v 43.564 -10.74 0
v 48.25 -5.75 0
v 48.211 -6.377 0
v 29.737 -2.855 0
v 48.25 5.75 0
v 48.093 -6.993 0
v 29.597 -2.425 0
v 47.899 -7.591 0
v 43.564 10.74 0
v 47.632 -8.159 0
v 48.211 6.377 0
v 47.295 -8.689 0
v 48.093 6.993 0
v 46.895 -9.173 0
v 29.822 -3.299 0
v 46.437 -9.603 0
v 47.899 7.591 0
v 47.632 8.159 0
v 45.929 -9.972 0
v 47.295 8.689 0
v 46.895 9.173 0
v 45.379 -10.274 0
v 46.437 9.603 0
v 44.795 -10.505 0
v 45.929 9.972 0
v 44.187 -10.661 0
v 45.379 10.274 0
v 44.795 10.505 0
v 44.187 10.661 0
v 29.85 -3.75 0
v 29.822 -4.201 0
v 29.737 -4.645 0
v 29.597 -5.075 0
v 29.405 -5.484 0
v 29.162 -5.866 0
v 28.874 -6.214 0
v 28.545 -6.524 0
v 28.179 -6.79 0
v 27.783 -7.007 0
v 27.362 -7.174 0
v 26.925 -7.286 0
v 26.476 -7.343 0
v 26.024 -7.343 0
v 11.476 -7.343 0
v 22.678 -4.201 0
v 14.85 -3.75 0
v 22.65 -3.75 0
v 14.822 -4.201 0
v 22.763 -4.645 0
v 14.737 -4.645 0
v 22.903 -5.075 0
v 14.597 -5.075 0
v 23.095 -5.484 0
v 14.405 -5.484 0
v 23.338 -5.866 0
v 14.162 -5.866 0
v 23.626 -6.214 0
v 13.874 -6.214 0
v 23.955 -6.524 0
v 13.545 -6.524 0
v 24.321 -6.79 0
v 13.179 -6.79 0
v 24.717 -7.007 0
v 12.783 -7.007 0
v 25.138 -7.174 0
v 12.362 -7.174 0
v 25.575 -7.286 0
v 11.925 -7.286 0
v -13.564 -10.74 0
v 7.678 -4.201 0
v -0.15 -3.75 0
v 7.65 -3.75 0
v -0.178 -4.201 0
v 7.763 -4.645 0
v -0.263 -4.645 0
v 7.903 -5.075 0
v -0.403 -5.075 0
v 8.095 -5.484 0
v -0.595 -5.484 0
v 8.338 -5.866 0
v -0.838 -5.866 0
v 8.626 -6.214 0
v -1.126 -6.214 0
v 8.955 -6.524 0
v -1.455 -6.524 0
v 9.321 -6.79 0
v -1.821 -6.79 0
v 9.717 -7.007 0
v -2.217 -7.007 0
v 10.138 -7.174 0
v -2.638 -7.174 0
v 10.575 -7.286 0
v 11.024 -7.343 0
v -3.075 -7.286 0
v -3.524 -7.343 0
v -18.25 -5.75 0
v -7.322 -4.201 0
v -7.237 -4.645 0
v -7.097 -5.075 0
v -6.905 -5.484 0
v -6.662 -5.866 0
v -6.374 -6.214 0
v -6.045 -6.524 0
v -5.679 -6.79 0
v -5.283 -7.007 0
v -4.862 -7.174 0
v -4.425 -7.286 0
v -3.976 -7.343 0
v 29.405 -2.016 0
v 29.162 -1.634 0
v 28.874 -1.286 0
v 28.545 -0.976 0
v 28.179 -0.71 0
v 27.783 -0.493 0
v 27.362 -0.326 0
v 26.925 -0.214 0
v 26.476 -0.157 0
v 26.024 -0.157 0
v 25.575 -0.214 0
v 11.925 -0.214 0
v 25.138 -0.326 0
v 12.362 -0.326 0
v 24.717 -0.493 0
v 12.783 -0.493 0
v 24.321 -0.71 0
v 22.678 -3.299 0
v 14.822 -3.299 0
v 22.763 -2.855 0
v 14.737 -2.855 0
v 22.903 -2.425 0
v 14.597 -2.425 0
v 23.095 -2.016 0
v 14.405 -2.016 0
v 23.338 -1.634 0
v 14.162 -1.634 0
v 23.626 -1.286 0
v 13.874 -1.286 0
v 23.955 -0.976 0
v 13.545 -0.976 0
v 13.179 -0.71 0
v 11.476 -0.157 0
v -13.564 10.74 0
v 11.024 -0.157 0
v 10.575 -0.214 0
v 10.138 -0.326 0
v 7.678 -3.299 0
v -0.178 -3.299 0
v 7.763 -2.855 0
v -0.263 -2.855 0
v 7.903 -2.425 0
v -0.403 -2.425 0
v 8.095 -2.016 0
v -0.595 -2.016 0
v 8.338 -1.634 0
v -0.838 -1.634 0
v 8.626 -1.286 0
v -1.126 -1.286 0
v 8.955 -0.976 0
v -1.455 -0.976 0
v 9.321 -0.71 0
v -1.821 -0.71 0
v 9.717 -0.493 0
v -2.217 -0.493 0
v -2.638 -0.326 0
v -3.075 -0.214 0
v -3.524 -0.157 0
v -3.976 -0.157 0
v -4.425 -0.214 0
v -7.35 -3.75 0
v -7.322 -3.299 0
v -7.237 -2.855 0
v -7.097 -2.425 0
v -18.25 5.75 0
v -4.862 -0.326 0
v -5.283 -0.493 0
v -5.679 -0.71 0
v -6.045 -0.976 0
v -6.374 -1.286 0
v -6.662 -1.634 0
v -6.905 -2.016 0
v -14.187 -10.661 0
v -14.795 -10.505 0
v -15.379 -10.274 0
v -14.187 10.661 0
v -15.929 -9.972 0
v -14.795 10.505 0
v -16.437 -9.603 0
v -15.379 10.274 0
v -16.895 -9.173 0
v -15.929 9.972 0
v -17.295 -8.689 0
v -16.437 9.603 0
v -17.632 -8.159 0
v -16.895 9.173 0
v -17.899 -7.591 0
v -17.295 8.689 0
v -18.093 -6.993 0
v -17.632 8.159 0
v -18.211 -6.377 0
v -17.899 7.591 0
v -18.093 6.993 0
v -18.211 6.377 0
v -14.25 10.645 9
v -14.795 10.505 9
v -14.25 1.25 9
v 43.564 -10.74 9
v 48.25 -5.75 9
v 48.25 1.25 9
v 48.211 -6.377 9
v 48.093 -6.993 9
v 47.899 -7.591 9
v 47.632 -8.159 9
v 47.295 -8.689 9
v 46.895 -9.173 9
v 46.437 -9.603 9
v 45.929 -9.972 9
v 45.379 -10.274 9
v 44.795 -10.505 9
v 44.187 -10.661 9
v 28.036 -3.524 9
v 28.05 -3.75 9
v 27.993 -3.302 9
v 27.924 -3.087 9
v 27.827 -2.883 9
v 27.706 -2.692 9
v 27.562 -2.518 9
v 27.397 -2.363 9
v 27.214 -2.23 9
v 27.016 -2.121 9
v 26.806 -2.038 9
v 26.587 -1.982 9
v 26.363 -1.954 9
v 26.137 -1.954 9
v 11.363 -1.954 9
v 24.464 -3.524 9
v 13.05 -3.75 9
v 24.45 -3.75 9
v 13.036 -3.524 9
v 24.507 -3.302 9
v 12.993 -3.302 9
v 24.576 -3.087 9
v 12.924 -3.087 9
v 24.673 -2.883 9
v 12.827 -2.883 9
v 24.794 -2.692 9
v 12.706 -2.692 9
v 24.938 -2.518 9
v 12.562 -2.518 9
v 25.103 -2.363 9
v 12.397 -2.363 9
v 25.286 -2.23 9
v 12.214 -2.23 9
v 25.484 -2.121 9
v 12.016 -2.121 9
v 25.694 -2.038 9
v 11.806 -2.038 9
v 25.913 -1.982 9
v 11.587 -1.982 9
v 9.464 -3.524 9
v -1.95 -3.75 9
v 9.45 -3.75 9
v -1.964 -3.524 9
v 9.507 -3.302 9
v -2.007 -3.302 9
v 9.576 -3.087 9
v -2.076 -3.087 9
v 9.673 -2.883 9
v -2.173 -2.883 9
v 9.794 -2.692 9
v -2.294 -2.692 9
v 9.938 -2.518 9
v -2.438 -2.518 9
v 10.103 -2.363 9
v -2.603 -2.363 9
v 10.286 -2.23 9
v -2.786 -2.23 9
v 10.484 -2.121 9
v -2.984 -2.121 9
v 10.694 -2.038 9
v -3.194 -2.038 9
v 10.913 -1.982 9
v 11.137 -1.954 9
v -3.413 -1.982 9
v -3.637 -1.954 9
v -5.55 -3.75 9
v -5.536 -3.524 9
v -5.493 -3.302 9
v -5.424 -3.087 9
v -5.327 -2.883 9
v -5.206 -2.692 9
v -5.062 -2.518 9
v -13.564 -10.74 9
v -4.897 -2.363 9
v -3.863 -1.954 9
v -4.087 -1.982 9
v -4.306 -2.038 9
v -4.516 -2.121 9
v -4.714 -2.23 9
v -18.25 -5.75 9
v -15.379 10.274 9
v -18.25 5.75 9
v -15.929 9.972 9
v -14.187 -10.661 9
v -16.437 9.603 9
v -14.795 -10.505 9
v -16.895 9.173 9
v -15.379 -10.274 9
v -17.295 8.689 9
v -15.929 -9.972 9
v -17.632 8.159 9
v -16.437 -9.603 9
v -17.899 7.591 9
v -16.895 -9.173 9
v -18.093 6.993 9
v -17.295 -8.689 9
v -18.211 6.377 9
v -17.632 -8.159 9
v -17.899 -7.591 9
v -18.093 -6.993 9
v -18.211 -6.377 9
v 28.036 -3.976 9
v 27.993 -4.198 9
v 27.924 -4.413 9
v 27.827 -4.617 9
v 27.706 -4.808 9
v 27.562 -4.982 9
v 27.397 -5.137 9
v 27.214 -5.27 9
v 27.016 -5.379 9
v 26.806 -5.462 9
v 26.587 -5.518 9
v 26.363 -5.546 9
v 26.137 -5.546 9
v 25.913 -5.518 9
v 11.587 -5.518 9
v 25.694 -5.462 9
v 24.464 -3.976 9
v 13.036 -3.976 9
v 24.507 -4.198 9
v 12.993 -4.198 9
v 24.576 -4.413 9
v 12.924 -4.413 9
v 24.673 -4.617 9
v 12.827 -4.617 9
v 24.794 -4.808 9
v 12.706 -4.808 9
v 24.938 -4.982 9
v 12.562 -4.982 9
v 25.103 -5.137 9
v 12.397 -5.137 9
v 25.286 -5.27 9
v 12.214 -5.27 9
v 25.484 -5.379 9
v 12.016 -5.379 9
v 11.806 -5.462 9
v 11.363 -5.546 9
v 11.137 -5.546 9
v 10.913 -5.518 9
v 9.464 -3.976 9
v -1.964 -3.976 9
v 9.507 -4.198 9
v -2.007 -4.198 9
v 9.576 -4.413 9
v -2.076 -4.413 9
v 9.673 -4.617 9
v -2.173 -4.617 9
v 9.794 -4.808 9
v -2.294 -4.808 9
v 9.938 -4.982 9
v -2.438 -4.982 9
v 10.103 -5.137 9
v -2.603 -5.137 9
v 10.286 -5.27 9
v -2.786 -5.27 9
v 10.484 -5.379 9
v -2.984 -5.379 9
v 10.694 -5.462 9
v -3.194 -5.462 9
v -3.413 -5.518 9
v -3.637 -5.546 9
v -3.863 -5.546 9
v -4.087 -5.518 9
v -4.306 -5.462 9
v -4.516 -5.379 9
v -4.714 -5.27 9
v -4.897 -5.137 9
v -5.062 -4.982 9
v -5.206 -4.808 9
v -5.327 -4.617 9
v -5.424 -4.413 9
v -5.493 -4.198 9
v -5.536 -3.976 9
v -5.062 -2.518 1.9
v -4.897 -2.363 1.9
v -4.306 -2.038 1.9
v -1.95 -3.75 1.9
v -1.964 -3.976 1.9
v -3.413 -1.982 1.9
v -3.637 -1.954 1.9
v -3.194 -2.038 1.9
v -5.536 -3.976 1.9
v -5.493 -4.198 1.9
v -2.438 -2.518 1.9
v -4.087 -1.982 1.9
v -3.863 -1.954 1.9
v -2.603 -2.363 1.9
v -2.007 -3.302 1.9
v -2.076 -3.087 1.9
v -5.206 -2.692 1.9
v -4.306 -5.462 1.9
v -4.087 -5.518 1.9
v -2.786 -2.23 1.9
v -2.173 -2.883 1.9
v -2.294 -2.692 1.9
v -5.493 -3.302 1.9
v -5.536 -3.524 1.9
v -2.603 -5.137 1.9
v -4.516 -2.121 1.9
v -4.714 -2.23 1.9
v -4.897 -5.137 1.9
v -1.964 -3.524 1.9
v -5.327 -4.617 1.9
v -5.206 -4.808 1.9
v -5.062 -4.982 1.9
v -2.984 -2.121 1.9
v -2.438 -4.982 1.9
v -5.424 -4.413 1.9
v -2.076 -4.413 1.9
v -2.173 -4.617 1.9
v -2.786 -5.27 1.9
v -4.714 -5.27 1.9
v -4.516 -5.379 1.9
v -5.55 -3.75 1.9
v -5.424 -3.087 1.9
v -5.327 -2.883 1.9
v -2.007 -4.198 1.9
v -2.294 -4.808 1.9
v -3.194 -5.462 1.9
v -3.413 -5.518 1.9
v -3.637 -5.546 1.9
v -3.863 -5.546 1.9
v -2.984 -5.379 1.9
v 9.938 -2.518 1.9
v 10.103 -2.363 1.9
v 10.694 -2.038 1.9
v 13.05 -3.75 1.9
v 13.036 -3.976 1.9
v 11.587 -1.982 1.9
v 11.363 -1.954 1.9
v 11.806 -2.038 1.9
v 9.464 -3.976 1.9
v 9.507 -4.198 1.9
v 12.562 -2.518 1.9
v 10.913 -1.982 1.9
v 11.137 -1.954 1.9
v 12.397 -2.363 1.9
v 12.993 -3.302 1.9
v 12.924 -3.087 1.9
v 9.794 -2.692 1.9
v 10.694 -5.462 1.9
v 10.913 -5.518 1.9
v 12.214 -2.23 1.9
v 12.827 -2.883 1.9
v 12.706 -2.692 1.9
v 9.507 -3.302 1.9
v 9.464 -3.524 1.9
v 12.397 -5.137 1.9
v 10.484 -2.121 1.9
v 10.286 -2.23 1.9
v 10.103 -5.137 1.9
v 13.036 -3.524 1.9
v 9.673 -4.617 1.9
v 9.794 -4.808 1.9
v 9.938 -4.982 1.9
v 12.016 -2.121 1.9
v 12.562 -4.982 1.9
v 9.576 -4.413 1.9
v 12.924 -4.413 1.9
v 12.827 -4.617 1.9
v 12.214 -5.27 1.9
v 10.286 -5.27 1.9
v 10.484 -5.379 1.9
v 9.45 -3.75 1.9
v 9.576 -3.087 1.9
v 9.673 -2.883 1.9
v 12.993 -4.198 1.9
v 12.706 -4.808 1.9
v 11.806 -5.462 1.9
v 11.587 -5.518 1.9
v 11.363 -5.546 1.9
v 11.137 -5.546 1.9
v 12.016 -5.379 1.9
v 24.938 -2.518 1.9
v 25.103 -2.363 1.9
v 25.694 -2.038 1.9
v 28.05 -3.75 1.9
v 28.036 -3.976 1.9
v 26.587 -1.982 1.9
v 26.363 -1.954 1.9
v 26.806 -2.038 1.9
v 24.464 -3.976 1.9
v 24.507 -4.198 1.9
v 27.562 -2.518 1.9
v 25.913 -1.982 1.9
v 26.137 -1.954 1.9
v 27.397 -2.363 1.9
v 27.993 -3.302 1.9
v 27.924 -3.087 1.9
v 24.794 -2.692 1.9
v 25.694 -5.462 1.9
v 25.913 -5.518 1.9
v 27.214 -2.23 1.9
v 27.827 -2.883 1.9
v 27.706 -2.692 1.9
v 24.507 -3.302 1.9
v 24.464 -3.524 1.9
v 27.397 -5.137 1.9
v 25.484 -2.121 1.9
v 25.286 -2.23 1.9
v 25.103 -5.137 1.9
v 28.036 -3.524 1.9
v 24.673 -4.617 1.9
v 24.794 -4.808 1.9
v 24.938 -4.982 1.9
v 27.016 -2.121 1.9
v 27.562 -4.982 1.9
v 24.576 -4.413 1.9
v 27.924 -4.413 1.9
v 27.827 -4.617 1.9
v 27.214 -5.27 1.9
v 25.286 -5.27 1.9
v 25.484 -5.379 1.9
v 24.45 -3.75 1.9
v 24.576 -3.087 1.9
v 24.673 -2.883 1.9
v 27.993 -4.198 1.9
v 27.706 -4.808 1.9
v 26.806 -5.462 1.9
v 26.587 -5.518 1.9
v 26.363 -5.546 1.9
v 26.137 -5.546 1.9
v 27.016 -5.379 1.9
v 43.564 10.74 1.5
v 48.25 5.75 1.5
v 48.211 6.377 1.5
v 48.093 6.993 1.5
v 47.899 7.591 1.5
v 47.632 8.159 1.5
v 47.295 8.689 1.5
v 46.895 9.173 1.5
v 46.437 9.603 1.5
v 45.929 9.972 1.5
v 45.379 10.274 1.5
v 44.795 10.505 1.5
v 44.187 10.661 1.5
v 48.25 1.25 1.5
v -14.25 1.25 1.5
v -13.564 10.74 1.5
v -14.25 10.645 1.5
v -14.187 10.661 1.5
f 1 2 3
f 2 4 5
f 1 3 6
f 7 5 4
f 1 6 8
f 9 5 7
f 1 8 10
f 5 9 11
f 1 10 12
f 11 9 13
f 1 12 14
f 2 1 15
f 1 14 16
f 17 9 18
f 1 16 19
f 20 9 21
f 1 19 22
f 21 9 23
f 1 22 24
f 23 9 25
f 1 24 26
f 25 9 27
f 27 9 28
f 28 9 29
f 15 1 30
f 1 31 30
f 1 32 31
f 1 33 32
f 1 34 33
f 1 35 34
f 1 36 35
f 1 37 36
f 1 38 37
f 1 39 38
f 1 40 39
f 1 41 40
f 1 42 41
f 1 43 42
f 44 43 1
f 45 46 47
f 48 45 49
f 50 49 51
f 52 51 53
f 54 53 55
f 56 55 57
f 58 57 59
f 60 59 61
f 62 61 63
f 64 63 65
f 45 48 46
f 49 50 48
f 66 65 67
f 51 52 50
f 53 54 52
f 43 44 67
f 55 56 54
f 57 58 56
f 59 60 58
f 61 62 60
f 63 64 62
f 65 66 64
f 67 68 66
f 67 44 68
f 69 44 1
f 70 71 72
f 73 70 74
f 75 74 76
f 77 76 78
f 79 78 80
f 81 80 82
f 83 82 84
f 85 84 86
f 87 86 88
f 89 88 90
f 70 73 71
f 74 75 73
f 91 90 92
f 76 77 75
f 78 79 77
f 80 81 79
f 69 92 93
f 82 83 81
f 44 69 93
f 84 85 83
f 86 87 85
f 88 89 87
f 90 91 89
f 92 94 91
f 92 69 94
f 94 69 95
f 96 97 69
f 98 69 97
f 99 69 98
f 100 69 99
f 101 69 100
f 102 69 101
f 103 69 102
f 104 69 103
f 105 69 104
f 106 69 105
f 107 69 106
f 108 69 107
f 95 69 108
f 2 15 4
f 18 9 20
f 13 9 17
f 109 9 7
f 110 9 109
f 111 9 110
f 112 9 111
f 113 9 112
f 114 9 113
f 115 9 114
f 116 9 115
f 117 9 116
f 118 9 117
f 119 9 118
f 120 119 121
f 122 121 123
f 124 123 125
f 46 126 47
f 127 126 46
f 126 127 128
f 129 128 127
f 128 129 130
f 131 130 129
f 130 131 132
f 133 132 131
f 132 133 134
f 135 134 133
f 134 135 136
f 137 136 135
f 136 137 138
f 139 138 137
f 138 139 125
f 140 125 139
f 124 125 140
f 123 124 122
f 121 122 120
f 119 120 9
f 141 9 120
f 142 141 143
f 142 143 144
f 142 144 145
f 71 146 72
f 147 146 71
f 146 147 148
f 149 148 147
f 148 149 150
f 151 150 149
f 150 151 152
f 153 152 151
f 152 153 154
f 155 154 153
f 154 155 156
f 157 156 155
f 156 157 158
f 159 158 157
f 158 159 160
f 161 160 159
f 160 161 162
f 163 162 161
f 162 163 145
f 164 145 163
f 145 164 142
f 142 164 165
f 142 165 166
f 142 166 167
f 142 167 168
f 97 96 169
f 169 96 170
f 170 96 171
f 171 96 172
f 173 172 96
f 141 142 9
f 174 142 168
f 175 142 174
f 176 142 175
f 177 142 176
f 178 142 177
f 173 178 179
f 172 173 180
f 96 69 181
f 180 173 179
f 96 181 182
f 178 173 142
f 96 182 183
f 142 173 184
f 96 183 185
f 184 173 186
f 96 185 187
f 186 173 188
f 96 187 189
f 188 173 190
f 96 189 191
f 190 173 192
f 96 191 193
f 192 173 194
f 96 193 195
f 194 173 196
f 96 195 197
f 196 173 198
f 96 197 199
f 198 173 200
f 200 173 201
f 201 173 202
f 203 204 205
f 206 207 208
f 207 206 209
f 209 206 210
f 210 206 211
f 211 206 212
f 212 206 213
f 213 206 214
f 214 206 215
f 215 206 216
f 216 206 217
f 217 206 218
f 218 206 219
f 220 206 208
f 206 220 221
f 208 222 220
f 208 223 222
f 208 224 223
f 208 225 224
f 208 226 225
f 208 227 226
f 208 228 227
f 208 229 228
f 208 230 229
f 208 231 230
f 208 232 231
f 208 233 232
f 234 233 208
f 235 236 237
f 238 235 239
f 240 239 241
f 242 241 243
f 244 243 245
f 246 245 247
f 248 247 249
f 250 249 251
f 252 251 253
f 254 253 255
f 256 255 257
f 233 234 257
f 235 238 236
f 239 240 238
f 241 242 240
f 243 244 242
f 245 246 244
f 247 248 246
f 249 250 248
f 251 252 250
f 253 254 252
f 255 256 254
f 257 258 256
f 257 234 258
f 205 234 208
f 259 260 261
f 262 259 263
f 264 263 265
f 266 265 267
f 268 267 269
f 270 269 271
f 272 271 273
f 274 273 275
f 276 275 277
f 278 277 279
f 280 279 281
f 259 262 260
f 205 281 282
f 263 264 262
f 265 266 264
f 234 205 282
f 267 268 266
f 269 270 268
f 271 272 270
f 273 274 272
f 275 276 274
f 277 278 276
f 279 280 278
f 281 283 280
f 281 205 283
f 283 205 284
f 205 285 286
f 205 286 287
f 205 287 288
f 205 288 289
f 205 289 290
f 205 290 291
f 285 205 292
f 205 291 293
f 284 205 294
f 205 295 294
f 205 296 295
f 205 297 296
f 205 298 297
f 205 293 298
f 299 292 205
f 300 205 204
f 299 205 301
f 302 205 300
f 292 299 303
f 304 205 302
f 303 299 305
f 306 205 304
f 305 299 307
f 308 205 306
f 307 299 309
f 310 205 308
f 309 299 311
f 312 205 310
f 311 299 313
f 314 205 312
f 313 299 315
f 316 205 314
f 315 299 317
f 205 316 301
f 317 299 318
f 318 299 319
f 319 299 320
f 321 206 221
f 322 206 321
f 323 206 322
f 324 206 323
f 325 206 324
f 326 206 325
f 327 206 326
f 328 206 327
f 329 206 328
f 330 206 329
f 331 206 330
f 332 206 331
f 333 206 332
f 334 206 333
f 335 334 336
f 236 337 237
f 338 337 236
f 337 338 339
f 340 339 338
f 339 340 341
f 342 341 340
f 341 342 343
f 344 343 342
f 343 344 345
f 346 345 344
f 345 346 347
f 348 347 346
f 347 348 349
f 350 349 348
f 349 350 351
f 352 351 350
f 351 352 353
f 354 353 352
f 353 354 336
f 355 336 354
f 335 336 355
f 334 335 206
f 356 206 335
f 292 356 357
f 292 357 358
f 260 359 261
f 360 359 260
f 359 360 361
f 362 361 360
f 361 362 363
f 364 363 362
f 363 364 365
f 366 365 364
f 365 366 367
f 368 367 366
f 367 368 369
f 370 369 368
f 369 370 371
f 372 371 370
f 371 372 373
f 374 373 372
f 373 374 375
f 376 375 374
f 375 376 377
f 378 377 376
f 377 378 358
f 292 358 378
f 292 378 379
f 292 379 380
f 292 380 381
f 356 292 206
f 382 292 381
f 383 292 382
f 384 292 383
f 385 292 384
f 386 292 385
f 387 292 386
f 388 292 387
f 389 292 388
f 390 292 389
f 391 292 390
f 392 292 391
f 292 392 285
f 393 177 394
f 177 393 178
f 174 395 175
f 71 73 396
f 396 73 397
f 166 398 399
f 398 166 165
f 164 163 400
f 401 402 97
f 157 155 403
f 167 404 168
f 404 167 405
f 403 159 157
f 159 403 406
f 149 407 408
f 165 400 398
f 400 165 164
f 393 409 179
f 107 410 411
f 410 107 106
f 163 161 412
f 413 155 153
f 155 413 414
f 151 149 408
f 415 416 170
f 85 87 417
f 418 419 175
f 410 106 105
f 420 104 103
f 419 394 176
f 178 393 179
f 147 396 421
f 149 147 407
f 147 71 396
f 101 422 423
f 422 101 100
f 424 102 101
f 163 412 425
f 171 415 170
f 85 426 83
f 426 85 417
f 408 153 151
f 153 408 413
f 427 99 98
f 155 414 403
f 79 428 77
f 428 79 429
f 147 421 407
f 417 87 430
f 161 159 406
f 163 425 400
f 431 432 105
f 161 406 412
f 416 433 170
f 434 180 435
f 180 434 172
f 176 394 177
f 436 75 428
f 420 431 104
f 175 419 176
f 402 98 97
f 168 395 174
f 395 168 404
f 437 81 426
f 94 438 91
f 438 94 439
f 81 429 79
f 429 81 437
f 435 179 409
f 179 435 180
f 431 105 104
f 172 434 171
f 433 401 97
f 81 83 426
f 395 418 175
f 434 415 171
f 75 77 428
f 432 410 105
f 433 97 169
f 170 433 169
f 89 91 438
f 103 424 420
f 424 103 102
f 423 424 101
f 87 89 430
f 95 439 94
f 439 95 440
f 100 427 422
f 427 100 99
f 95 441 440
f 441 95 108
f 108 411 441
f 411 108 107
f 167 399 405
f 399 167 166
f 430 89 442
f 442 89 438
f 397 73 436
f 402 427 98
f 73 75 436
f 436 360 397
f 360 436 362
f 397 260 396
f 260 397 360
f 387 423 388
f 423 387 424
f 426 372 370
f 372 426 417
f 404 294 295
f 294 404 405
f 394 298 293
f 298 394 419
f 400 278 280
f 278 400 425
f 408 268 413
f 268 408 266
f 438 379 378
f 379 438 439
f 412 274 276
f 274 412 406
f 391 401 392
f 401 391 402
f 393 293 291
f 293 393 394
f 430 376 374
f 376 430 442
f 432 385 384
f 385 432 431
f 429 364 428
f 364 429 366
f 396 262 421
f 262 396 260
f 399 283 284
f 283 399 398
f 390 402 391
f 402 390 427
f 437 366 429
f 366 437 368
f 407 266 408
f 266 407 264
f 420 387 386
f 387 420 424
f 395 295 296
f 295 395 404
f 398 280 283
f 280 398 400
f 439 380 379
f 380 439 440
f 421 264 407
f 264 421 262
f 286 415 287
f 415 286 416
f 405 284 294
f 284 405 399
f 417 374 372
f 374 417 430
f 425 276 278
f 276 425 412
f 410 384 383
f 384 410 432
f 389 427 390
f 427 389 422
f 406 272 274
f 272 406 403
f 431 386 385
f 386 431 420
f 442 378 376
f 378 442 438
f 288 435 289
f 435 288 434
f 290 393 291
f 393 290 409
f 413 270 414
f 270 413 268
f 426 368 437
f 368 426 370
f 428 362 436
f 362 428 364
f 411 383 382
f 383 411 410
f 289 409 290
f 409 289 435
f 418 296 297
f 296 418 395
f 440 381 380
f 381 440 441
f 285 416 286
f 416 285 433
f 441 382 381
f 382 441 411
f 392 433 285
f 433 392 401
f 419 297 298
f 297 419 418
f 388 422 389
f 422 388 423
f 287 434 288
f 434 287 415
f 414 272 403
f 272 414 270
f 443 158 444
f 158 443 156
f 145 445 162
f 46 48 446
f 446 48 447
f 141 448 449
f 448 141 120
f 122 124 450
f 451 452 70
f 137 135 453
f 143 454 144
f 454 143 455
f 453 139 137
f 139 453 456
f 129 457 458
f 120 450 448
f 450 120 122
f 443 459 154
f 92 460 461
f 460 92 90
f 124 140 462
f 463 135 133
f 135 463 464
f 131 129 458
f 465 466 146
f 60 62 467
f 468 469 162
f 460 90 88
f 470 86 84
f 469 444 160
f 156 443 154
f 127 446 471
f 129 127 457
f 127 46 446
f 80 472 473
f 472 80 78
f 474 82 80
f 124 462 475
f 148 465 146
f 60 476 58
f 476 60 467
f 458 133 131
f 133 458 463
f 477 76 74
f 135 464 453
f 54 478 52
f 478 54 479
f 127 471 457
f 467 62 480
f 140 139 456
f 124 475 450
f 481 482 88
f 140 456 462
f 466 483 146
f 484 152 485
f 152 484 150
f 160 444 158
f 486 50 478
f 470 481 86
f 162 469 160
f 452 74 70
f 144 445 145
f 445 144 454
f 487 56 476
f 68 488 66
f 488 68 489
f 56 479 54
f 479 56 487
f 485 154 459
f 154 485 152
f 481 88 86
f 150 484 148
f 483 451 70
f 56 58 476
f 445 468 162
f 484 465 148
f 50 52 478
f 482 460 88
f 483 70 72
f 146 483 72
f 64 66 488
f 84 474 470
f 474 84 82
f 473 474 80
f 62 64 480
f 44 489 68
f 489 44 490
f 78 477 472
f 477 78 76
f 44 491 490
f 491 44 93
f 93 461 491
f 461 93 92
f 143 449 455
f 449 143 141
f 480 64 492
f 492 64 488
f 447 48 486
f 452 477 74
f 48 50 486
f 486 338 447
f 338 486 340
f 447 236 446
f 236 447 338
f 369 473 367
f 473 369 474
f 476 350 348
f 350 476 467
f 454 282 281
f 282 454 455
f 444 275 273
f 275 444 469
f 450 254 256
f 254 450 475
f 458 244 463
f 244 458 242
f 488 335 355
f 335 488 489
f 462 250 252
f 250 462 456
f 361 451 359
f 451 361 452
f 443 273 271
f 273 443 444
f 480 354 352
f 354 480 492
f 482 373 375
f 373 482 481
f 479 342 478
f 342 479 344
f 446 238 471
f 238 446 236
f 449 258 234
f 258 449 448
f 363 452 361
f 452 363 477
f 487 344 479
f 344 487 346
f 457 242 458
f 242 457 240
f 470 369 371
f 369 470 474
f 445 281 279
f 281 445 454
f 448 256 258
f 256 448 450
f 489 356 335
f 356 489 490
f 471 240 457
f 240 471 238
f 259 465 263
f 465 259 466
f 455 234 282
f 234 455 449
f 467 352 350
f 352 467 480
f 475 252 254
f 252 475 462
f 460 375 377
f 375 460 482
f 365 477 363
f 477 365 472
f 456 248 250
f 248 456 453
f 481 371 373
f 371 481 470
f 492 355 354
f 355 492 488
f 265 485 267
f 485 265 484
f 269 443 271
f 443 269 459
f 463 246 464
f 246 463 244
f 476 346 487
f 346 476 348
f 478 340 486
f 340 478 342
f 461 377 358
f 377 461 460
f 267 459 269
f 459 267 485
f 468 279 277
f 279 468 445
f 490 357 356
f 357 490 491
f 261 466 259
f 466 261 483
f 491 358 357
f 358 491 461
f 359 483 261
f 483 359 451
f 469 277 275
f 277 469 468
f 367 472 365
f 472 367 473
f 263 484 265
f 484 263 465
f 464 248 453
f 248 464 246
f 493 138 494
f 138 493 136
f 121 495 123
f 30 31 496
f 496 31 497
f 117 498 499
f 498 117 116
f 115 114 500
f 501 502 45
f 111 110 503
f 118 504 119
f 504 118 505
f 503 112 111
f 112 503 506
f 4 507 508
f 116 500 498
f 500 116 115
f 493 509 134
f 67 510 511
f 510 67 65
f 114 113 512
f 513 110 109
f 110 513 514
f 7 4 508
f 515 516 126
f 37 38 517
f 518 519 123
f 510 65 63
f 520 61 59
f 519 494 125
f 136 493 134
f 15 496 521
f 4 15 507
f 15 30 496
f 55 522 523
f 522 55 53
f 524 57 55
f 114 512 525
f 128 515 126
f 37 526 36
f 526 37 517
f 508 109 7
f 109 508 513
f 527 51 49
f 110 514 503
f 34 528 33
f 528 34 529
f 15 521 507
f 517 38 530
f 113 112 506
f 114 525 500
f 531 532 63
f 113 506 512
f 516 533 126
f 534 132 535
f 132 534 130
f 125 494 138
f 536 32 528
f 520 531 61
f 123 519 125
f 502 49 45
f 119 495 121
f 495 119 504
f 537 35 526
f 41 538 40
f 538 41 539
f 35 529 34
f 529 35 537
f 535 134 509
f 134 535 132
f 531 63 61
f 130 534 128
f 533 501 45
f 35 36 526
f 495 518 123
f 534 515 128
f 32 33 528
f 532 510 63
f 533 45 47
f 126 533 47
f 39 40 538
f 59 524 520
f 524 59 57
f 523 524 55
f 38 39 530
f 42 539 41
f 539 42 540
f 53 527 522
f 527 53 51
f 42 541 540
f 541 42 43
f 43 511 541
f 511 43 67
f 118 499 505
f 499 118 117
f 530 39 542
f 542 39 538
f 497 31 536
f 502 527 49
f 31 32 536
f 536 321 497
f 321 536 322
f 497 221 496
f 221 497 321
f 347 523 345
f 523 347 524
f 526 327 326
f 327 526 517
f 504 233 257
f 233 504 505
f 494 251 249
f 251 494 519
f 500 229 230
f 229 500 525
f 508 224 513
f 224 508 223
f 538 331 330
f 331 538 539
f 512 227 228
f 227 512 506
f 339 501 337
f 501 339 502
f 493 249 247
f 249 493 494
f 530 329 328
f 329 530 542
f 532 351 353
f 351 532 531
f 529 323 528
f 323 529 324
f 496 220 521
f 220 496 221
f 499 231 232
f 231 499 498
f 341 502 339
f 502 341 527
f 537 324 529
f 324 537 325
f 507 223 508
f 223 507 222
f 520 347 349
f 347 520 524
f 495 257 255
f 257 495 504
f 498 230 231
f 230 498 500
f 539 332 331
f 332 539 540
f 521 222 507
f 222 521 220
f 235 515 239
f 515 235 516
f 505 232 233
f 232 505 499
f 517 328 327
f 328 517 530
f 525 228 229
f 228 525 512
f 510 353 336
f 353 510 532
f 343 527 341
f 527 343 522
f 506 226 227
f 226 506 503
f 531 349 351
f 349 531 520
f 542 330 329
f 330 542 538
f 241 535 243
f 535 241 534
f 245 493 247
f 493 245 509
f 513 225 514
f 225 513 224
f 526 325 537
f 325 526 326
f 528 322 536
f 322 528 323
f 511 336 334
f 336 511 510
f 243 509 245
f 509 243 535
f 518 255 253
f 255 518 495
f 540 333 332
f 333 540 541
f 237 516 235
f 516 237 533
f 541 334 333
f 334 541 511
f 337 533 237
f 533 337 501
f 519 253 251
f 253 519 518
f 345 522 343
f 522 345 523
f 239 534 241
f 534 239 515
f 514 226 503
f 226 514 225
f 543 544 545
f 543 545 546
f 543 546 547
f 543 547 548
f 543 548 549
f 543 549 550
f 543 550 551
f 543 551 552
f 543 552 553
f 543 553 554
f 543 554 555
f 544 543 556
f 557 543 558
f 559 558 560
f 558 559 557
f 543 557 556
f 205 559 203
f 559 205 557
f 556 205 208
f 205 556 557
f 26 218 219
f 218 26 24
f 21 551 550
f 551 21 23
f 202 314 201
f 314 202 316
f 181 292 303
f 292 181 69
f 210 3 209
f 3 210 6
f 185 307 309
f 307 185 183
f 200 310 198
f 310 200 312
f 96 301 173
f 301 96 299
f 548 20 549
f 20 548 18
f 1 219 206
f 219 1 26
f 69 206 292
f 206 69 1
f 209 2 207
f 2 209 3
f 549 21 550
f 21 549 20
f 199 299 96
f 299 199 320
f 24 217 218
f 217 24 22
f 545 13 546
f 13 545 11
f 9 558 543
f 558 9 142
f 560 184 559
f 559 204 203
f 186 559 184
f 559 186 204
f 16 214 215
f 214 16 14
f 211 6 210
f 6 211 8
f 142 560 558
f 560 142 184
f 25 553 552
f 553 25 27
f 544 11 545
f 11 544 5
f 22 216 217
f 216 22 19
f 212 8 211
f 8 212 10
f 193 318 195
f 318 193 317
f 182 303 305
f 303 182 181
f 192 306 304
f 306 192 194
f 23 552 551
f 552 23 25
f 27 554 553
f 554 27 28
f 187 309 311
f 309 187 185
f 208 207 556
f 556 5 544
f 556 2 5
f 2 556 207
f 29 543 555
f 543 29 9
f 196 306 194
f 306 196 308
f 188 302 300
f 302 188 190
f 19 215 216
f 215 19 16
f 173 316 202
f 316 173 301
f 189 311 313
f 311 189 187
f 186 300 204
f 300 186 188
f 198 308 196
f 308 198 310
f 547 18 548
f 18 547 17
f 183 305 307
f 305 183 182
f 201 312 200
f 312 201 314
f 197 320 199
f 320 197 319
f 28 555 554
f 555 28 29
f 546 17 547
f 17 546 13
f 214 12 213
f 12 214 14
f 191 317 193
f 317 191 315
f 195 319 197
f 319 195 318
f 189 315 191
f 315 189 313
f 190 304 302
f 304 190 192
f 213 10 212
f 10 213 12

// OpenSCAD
$fn = 50;


difference() {
	union() {
		translate(v = [15.0000000000, 0, 0]) {
			hull() {
				translate(v = [-28.2500000000, 5.7500000000, 0]) {
					cylinder(h = 9, r = 5);
				}
				translate(v = [28.2500000000, 5.7500000000, 0]) {
					cylinder(h = 9, r = 5);
				}
				translate(v = [-28.2500000000, -5.7500000000, 0]) {
					cylinder(h = 9, r = 5);
				}
				translate(v = [28.2500000000, -5.7500000000, 0]) {
					cylinder(h = 9, r = 5);
				}
			}
		}
	}
	union() {
		translate(v = [-3.7500000000, -3.7500000000, 0]) {
			rotate(a = [180, 0, 0]) {
				difference() {
					union() {
						#translate(v = [0, 0, -9.0000000000]) {
							cylinder(h = 9, r = 1.5000000000);
						}
						#translate(v = [0, 0, -1.9000000000]) {
							cylinder(h = 1.9000000000, r1 = 1.8000000000, r2 = 3.6000000000);
						}
						#translate(v = [0, 0, -9.0000000000]) {
							cylinder(h = 9, r = 1.8000000000);
						}
						#translate(v = [0, 0, -9.0000000000]) {
							cylinder(h = 9, r = 1.5000000000);
						}
					}
					union();
				}
			}
		}
		translate(v = [11.2500000000, -3.7500000000, 0]) {
			rotate(a = [180, 0, 0]) {
				difference() {
					union() {
						#translate(v = [0, 0, -9.0000000000]) {
							cylinder(h = 9, r = 1.5000000000);
						}
						#translate(v = [0, 0, -1.9000000000]) {
							cylinder(h = 1.9000000000, r1 = 1.8000000000, r2 = 3.6000000000);
						}
						#translate(v = [0, 0, -9.0000000000]) {
							cylinder(h = 9, r = 1.8000000000);
						}
						#translate(v = [0, 0, -9.0000000000]) {
							cylinder(h = 9, r = 1.5000000000);
						}
					}
					union();
				}
			}
		}
		translate(v = [26.2500000000, -3.7500000000, 0]) {
			rotate(a = [180, 0, 0]) {
				difference() {
					union() {
						#translate(v = [0, 0, -9.0000000000]) {
							cylinder(h = 9, r = 1.5000000000);
						}
						#translate(v = [0, 0, -1.9000000000]) {
							cylinder(h = 1.9000000000, r1 = 1.8000000000, r2 = 3.6000000000);
						}
						#translate(v = [0, 0, -9.0000000000]) {
							cylinder(h = 9, r = 1.8000000000);
						}
						#translate(v = [0, 0, -9.0000000000]) {
							cylinder(h = 9, r = 1.5000000000);
						}
					}
					union();
				}
			}
		}
		#translate(v = [-14.2500000000, 1.2500000000, 1.5000000000]) {
			cube(size = [156, 100, 7.5000000000]);
		}
	}
}
